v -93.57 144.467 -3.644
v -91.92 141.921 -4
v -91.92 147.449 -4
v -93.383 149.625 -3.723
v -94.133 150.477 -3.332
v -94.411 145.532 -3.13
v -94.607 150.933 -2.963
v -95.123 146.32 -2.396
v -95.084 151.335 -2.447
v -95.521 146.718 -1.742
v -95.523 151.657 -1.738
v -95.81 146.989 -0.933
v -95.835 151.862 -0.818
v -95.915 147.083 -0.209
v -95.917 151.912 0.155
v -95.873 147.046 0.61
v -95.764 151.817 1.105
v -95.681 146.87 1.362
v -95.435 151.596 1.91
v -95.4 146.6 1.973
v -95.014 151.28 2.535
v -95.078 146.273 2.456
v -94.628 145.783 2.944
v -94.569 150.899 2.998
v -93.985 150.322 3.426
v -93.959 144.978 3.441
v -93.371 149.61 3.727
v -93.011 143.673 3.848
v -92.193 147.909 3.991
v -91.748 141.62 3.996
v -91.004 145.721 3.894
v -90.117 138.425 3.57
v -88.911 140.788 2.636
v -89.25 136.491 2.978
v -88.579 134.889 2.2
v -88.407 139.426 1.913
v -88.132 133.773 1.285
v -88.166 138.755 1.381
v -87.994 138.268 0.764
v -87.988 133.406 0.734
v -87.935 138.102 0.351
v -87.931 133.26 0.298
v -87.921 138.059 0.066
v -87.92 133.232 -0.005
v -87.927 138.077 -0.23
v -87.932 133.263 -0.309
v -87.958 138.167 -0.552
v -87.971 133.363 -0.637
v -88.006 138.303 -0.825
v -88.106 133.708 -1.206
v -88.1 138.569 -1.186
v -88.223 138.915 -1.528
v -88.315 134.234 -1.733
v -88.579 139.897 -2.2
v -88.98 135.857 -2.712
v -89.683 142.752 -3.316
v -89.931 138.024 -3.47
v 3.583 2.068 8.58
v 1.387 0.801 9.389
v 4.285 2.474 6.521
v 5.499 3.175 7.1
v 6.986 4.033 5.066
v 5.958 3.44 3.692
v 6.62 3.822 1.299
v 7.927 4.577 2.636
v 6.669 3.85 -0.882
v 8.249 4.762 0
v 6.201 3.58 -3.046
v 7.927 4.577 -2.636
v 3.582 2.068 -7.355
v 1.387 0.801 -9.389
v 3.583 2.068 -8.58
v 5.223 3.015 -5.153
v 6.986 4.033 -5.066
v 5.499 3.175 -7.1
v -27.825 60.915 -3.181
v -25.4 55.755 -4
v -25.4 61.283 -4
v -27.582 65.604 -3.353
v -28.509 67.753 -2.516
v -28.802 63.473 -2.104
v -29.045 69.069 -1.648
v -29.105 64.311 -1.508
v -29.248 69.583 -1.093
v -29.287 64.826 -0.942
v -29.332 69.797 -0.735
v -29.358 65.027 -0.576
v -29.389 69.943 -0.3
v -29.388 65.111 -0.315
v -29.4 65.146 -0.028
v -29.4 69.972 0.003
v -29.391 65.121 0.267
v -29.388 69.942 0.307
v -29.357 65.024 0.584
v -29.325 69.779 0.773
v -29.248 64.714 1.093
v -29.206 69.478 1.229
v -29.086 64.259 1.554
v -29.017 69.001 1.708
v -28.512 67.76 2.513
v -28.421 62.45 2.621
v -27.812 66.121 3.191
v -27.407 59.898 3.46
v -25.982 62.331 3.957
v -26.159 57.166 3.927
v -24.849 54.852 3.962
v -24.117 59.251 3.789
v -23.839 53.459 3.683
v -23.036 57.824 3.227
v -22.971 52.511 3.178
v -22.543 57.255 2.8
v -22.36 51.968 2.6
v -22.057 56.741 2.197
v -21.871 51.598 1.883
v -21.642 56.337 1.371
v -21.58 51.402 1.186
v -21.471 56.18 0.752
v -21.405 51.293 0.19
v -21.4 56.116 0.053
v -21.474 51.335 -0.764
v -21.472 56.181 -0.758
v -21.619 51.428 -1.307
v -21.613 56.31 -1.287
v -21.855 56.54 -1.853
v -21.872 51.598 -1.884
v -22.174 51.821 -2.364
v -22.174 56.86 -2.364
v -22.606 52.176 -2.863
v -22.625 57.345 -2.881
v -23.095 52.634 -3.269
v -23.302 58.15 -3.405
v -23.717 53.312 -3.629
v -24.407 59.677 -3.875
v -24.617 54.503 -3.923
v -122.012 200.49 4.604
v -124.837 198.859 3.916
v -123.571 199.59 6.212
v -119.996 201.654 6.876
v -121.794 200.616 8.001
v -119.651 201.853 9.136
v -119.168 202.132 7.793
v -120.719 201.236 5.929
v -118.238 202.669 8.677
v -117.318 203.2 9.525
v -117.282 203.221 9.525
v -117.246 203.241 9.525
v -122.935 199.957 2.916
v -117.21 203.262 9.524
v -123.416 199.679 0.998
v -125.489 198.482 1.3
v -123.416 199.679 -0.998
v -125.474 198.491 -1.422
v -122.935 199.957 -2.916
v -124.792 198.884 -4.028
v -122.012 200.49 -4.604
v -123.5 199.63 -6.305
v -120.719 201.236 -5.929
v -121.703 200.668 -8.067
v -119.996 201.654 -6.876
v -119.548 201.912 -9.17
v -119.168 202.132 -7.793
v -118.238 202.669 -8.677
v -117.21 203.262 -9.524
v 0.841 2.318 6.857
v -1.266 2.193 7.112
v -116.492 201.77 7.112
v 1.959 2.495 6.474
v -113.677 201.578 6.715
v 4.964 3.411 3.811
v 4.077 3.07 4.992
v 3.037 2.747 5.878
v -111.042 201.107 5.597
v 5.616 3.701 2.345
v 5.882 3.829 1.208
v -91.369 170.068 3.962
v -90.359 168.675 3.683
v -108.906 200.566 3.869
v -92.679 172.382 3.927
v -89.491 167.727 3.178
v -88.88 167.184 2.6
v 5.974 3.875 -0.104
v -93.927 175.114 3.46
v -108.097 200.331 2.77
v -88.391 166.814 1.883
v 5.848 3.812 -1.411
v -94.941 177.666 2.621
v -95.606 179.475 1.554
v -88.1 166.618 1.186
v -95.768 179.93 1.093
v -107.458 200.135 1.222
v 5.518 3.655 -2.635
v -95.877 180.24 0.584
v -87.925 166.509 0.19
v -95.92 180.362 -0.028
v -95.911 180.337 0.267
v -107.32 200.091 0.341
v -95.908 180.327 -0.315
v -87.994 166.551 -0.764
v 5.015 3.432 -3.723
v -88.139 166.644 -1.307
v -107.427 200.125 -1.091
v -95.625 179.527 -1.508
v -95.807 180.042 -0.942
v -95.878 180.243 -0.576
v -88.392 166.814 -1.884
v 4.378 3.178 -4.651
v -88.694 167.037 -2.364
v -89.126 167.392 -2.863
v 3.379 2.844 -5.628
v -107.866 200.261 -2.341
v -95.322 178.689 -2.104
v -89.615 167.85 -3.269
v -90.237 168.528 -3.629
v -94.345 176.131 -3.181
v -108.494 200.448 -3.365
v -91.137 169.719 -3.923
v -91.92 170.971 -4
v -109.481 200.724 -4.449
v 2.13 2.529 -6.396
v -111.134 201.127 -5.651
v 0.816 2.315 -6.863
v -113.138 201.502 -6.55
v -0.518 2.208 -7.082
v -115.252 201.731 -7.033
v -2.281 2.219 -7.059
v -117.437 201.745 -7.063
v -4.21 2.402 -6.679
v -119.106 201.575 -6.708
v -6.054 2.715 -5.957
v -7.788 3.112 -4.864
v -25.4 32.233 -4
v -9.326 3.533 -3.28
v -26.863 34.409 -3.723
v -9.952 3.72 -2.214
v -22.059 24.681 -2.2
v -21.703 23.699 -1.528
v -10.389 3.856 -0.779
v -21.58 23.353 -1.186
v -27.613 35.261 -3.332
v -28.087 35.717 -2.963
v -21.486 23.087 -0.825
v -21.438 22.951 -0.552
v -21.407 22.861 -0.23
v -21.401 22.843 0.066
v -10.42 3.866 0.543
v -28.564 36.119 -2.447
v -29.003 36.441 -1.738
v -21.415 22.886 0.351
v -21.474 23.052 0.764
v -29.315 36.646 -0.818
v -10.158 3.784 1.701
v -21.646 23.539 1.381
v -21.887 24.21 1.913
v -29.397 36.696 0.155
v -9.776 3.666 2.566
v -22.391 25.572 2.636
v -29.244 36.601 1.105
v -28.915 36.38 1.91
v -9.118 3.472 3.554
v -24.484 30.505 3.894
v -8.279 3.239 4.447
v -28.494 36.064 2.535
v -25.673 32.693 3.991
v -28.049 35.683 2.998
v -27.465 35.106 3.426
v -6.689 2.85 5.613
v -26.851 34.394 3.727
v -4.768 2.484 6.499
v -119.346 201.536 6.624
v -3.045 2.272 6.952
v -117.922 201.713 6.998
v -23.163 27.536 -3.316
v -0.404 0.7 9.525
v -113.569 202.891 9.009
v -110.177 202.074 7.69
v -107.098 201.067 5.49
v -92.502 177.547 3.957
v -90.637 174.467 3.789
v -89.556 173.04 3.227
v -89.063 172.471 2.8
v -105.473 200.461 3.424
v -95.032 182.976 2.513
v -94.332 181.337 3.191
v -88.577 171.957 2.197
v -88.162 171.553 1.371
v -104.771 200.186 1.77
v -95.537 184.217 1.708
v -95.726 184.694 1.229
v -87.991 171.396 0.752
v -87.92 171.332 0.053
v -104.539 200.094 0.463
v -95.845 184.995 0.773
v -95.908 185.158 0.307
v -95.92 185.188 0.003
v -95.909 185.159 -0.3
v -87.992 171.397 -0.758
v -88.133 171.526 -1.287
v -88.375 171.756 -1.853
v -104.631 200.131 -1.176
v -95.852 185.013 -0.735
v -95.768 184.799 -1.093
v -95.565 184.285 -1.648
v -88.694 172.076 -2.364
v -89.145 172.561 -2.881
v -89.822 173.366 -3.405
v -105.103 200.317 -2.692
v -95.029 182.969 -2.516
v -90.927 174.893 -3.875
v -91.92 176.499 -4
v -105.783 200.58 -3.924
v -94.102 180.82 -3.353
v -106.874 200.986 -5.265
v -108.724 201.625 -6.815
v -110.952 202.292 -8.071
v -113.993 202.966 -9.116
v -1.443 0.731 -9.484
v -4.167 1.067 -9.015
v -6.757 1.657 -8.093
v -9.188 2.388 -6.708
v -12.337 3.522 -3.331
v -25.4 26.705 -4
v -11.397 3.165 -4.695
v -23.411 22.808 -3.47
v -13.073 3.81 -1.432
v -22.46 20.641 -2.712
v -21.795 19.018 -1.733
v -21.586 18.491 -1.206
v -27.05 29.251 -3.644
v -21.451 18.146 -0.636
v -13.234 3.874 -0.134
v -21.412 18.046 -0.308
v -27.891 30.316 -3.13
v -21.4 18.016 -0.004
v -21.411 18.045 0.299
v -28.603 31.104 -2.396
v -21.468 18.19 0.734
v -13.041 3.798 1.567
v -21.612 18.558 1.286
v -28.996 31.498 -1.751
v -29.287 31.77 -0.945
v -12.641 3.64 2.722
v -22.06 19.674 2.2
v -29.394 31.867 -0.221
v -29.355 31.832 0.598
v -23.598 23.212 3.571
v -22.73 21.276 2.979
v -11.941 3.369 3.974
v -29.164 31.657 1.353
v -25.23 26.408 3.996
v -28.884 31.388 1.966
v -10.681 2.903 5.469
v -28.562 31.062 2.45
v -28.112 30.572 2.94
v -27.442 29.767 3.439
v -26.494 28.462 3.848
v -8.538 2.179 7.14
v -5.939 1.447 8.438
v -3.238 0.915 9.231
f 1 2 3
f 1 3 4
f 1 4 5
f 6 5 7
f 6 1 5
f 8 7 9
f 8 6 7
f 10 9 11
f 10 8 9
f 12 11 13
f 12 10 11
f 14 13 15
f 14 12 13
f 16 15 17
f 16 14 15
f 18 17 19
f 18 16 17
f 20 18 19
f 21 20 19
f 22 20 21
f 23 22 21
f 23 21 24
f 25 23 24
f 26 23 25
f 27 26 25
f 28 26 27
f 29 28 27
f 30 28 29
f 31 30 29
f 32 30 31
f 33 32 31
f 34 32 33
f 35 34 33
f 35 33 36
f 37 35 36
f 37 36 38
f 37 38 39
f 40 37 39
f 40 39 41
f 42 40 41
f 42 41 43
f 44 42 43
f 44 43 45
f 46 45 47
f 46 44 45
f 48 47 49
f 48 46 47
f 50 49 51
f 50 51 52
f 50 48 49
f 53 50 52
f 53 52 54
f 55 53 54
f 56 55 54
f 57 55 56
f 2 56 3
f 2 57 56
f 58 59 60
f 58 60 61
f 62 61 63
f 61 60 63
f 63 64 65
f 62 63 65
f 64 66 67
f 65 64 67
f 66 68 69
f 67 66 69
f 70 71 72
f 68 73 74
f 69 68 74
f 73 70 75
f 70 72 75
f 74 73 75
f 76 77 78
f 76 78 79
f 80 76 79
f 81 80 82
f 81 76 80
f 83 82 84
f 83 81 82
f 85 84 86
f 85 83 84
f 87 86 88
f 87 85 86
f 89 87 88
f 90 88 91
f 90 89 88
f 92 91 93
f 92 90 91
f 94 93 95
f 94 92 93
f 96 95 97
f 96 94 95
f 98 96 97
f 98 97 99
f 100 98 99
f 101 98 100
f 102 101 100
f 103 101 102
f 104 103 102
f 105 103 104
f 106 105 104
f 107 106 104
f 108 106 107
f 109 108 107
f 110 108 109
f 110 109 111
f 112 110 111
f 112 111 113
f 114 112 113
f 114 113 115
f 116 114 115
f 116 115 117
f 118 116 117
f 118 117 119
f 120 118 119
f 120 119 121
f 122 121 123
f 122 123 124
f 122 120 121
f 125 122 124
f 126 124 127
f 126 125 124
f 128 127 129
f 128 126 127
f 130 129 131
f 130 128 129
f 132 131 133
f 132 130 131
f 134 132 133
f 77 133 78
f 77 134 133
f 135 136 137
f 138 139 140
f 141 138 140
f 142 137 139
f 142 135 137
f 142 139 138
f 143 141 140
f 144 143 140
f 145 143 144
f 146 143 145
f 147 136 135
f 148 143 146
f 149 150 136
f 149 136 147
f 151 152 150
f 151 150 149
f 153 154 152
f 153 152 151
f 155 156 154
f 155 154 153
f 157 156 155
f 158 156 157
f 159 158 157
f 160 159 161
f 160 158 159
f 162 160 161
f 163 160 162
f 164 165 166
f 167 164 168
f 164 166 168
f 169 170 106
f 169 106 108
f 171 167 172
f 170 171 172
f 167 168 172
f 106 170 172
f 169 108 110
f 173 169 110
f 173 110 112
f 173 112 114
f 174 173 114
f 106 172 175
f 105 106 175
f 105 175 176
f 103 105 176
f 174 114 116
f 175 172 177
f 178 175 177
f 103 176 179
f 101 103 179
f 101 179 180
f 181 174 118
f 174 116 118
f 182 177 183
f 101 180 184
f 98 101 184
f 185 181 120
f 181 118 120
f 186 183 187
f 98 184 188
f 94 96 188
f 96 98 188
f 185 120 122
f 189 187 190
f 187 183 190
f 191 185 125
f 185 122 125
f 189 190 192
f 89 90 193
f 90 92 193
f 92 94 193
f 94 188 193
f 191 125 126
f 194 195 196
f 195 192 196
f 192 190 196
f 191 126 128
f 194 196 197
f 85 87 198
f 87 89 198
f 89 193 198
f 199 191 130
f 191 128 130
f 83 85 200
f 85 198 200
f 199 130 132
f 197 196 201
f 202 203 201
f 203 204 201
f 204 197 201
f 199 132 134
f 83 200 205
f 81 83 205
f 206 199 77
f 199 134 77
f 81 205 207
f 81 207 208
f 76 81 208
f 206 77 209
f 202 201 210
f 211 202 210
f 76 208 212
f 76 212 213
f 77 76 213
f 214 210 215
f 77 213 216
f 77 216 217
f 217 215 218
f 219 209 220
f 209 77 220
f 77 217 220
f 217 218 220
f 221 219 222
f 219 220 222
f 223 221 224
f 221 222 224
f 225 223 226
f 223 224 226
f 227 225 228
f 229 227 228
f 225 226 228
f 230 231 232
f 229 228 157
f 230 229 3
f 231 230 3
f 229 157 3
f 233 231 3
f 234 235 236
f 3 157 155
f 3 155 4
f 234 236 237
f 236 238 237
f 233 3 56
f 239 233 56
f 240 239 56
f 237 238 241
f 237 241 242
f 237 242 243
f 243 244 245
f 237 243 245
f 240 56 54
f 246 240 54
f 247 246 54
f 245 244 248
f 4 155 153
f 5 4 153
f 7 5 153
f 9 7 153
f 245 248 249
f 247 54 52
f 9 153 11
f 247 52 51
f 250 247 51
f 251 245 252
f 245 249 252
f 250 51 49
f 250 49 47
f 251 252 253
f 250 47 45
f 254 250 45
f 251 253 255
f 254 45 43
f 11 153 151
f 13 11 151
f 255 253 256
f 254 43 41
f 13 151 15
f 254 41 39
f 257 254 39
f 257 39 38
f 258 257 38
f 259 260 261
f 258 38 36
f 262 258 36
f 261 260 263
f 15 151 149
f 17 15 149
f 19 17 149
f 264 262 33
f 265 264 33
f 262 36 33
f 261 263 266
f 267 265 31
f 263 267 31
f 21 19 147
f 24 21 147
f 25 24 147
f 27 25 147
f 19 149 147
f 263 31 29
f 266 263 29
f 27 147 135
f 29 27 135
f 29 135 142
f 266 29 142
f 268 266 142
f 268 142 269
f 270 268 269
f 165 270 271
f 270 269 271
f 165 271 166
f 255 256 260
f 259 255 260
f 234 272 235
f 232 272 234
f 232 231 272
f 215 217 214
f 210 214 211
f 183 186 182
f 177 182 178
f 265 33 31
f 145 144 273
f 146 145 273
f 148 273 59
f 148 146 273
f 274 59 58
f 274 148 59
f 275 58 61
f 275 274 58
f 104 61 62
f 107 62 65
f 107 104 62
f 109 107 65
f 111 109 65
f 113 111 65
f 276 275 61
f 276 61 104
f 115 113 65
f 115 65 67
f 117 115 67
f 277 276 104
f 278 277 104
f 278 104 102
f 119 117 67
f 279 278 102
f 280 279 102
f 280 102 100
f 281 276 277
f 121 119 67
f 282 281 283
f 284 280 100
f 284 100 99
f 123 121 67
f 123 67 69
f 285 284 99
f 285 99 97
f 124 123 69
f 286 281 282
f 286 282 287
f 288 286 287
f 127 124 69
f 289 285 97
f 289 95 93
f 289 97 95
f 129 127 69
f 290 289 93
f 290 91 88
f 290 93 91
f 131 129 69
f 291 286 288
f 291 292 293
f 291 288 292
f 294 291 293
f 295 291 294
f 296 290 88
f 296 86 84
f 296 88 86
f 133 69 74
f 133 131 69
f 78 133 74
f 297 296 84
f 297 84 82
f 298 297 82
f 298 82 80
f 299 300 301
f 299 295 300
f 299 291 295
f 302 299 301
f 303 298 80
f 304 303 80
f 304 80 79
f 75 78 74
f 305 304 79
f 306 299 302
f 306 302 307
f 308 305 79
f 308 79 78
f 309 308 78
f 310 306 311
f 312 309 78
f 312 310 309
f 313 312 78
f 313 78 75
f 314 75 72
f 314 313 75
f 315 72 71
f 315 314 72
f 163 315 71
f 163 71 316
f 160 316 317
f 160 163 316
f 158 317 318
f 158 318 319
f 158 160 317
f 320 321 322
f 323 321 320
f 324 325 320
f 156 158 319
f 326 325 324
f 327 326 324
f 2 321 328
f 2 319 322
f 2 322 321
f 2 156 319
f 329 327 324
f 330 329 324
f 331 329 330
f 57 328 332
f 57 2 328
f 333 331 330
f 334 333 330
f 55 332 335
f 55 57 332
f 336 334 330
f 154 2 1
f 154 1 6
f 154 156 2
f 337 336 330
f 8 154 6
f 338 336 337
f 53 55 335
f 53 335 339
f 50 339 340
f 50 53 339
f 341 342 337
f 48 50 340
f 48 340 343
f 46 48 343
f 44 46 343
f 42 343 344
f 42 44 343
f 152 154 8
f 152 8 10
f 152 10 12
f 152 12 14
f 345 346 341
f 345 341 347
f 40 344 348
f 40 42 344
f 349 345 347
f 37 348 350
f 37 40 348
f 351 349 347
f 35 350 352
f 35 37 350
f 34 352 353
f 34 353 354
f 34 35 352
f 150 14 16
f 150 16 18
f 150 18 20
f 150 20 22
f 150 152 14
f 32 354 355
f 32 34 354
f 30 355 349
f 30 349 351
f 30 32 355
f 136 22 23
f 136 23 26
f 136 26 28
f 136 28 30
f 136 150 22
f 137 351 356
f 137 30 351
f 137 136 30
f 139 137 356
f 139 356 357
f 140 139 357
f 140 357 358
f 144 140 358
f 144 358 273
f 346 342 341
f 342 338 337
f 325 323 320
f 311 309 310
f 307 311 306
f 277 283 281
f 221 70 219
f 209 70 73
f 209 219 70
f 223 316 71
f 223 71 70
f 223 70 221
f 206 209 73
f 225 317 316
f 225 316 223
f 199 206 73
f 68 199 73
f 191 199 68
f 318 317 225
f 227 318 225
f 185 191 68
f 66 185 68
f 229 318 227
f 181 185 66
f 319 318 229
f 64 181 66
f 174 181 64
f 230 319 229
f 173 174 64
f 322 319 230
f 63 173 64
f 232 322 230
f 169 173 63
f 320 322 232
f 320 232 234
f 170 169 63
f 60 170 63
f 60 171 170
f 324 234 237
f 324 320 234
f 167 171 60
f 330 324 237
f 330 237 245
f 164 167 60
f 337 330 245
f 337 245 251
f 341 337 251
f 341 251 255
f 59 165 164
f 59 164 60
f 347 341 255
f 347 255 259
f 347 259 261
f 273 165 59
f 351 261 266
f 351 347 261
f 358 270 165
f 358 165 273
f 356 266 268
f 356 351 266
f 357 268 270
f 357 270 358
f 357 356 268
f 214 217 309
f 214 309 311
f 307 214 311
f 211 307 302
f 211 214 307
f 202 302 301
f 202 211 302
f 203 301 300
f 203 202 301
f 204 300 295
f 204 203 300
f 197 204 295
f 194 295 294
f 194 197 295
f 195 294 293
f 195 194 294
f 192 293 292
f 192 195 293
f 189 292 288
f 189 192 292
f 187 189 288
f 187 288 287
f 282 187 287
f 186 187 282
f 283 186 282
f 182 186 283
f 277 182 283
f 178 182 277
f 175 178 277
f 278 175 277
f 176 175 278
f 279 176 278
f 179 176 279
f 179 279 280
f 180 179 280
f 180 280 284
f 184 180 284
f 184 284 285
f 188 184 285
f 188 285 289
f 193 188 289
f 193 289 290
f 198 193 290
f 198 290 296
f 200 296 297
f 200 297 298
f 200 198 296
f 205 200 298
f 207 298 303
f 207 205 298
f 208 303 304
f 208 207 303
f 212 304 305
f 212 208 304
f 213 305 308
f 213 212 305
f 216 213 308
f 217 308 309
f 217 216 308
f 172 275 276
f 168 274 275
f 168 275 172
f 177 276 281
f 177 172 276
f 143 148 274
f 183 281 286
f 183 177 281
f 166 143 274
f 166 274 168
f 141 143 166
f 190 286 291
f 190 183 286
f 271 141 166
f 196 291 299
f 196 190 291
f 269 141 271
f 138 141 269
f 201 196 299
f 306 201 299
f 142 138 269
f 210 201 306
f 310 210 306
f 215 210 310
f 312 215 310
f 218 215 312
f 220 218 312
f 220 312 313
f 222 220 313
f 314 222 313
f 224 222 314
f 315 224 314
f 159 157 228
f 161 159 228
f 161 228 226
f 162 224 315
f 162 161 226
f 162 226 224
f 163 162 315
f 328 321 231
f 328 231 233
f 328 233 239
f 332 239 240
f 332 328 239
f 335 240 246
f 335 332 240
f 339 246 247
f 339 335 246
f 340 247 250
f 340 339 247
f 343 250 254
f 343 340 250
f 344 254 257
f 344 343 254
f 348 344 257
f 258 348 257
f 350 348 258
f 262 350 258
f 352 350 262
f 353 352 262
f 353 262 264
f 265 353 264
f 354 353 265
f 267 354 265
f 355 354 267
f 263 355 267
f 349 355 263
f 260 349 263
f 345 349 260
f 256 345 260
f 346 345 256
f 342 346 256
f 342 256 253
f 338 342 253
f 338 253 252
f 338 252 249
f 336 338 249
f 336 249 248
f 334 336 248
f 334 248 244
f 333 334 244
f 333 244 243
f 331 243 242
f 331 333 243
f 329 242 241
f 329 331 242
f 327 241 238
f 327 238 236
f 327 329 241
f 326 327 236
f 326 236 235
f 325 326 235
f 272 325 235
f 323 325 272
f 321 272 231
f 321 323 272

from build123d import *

# Parameters (mm, degrees)
SKETCH2_R               = 9.525
SKETCH2_R_2             = 7.112
CUT_EXTRUDE2_DEPTH      = 542
CUT_EXTRUDE2_DEPTH_BACK = 70
SKETCH4_R               = 4
CUT_EXTRUDE3_DEPTH      = 105
CUT_EXTRUDE3_DEPTH_BACK = 311
SKETCH5_R               = 15.875


with BuildPart() as part:
    # Sweep1: sweep along a path in Sketch1
    with BuildLine(Plane.XY) as sweep1_path:
        Line((0, 0), (-117.317574699, 203.2))
    # Sketch2 → Sweep1 (sweep)
    with BuildSketch(Plane(origin=(0, 0, 0), x_dir=(0, 0, 1), z_dir=(-0.5000000000000041, 0.8660254037844362, 0))):
        Circle(SKETCH2_R)
        Circle(SKETCH2_R_2, mode=Mode.SUBTRACT)
    sweep(path=sweep1_path.line)

    # Sketch4 → Cut-Extrude2 (cut, two sides: drawn at the far end of the back side and taken through both)
    with BuildSketch(Plane(origin=(0, 0, 0), x_dir=(1, 0, 0), z_dir=(0, 1, 0)).offset(-CUT_EXTRUDE2_DEPTH_BACK)):
        with Locations(Location((-25.4, 0, 0), (0, 0, 90))):
            Circle(SKETCH4_R)
        with Locations(Location((-91.92, 0, 0), (0, 0, 90))):
            Circle(SKETCH4_R)
    extrude(amount=CUT_EXTRUDE2_DEPTH + CUT_EXTRUDE2_DEPTH_BACK, mode=Mode.SUBTRACT)

    # Sketch5 → Cut-Extrude3 (cut, two sides: drawn at the far end of the back side and taken through both)
    with BuildSketch(Plane(origin=(0, 0, 0), x_dir=(0, 0, -1), z_dir=(1, 0, 0)).offset(-CUT_EXTRUDE3_DEPTH_BACK)):
        with Locations((0, -12)):
            Circle(SKETCH5_R)
        with Locations((0, 215.9625)):
            Circle(SKETCH5_R)
    extrude(amount=CUT_EXTRUDE3_DEPTH + CUT_EXTRUDE3_DEPTH_BACK, mode=Mode.SUBTRACT)


solid = part.part
